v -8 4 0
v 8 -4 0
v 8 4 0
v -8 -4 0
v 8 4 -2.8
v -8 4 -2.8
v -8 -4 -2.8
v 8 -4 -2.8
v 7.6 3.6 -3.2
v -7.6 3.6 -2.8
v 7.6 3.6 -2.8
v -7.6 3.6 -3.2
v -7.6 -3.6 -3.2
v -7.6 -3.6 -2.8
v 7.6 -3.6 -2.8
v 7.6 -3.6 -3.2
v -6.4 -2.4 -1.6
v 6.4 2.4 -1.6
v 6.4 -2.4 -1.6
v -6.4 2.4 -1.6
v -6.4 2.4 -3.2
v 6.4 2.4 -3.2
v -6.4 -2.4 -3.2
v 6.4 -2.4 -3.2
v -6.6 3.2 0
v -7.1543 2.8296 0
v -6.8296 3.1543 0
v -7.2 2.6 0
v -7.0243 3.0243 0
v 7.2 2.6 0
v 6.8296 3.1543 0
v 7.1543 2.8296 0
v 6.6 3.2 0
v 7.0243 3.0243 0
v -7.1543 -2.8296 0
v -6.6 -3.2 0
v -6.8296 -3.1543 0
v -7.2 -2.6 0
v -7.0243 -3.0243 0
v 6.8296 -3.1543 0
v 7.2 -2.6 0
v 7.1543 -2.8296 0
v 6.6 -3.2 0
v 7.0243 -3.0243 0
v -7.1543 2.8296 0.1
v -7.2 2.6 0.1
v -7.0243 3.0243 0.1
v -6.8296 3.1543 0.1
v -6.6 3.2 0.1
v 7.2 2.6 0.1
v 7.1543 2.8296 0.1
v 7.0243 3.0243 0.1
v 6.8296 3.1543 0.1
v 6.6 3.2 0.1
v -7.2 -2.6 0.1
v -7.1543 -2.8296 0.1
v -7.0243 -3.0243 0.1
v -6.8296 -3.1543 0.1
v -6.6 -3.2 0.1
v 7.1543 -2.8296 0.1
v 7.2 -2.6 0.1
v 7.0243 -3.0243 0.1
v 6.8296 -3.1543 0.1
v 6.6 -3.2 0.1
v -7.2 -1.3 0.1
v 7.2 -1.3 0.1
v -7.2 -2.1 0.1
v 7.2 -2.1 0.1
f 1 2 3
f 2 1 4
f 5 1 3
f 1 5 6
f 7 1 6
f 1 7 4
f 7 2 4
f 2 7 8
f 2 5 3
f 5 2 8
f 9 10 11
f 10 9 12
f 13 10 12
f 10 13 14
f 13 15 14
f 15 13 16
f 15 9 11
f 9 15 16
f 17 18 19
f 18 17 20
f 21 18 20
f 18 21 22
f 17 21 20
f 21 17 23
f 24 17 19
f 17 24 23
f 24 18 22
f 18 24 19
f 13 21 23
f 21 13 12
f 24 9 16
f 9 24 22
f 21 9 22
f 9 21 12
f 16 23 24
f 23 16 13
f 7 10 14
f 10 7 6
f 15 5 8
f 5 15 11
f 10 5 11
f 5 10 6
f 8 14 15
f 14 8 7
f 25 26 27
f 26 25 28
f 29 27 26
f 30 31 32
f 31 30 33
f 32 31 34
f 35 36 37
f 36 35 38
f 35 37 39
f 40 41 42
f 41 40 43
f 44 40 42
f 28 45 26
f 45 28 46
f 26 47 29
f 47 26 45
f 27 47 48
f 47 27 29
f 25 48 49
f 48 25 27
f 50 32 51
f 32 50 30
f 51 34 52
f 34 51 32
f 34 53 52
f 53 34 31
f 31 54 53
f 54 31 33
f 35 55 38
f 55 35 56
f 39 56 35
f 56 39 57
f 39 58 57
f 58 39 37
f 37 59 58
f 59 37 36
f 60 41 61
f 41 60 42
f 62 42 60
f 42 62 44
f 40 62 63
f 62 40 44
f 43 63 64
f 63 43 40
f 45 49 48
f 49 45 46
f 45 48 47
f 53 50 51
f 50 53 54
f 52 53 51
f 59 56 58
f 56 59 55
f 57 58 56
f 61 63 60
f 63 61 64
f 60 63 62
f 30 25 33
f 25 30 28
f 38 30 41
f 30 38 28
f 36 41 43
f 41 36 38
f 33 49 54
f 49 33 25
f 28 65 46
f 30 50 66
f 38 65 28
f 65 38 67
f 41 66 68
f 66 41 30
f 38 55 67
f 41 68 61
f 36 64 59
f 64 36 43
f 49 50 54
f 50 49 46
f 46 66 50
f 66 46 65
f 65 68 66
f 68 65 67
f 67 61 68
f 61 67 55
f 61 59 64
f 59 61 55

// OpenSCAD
// file: ../p/box5.scad
use <../lib.scad>
function ldraw_lib__box5() = [
// 0 Box with 5 Faces and All Edges
// 0 Name: box5.dat
// 0 Author: James Jessiman
// 0 !LDRAW_ORG Primitive UPDATE 2012-01
// 0 !LICENSE Licensed under CC BY 4.0 : see CAreadme.txt
// 
// 0 BFC CERTIFY CCW
  [0,"BFC","CERTIFY"],
  [0,"BFC","CCW"],
// 
// 0 !HISTORY 2002-04-03 [sbliss] Modified for BFC compliance
// 0 !HISTORY 2002-04-25 [PTadmin] Official Update 2002-02
// 0 !HISTORY 2007-06-24 [PTadmin] Header formatted for Contributor Agreement
// 0 !HISTORY 2008-07-01 [PTadmin] Official Update 2008-01
// 0 !HISTORY 2012-02-16 [Philo] Changed to CCW
// 0 !HISTORY 2012-03-30 [PTadmin] Official Update 2012-01
// 
// 
// 2 24 1 1 1 -1 1 1
  [2,24,1,1,1,-1,1,1],
// 2 24 -1 1 1 -1 1 -1
  [2,24,-1,1,1,-1,1,-1],
// 2 24 -1 1 -1 1 1 -1
  [2,24,-1,1,-1,1,1,-1],
// 2 24 1 1 -1 1 1 1
  [2,24,1,1,-1,1,1,1],
// 2 24 1 0 1 -1 0 1
  [2,24,1,0,1,-1,0,1],
// 2 24 -1 0 1 -1 0 -1
  [2,24,-1,0,1,-1,0,-1],
// 2 24 -1 0 -1 1 0 -1
  [2,24,-1,0,-1,1,0,-1],
// 2 24 1 0 -1 1 0 1
  [2,24,1,0,-1,1,0,1],
// 2 24 1 0 1 1 1 1
  [2,24,1,0,1,1,1,1],
// 2 24 -1 0 1 -1 1 1
  [2,24,-1,0,1,-1,1,1],
// 2 24 1 0 -1 1 1 -1
  [2,24,1,0,-1,1,1,-1],
// 2 24 -1 0 -1 -1 1 -1
  [2,24,-1,0,-1,-1,1,-1],
// 4 16 -1 1 1 1 1 1 1 1 -1 -1 1 -1
  [4,16,-1,1,1,1,1,1,1,1,-1,-1,1,-1],
// 4 16 -1 1 1 -1 0 1 1 0 1 1 1 1
  [4,16,-1,1,1,-1,0,1,1,0,1,1,1,1],
// 4 16 -1 1 -1 -1 0 -1 -1 0 1 -1 1 1
  [4,16,-1,1,-1,-1,0,-1,-1,0,1,-1,1,1],
// 4 16 1 1 -1 1 0 -1 -1 0 -1 -1 1 -1
  [4,16,1,1,-1,1,0,-1,-1,0,-1,-1,1,-1],
// 4 16 1 1 1 1 0 1 1 0 -1 1 1 -1
  [4,16,1,1,1,1,0,1,1,0,-1,1,1,-1],
];
module ldraw_lib__box5(step=0, col=false, unit=2/5, alt=false, line=0.2, solid=!$preview)
    makepoly(ldraw_lib__box5(), step=step, col=col, unit=unit, alt=alt, line=line, solid=solid);
ldraw_lib__box5(line=0.2);
// file: ../p/box4.scad
use <../lib.scad>
function ldraw_lib__box4() = [
// 0 Box with 4 Faces (2 Parallel Pairs) and All Edges
// 0 Name: box4.dat
// 0 Author: James Jessiman
// 0 !LDRAW_ORG Primitive UPDATE 2012-01
// 0 !LICENSE Licensed under CC BY 4.0 : see CAreadme.txt
// 
// 0 BFC CERTIFY CCW
  [0,"BFC","CERTIFY"],
  [0,"BFC","CCW"],
// 
// 0 !HISTORY 2002-04-03 [sbliss] Modified for BFC compliance
// 0 !HISTORY 2002-04-25 [PTadmin] Official Update 2002-02
// 0 !HISTORY 2007-06-24 [PTadmin] Header formatted for Contributor Agreement
// 0 !HISTORY 2008-07-01 [PTadmin] Official Update 2008-01
// 0 !HISTORY 2012-02-16 [Philo] Changed to CCW
// 0 !HISTORY 2012-03-30 [PTadmin] Official Update 2012-01
// 
// 
// 2 24 1 1 1 -1 1 1
  [2,24,1,1,1,-1,1,1],
// 2 24 -1 1 1 -1 1 -1
  [2,24,-1,1,1,-1,1,-1],
// 2 24 -1 1 -1 1 1 -1
  [2,24,-1,1,-1,1,1,-1],
// 2 24 1 1 -1 1 1 1
  [2,24,1,1,-1,1,1,1],
// 2 24 1 0 1 -1 0 1
  [2,24,1,0,1,-1,0,1],
// 2 24 -1 0 1 -1 0 -1
  [2,24,-1,0,1,-1,0,-1],
// 2 24 -1 0 -1 1 0 -1
  [2,24,-1,0,-1,1,0,-1],
// 2 24 1 0 -1 1 0 1
  [2,24,1,0,-1,1,0,1],
// 2 24 1 0 1 1 1 1
  [2,24,1,0,1,1,1,1],
// 2 24 -1 0 1 -1 1 1
  [2,24,-1,0,1,-1,1,1],
// 2 24 1 0 -1 1 1 -1
  [2,24,1,0,-1,1,1,-1],
// 2 24 -1 0 -1 -1 1 -1
  [2,24,-1,0,-1,-1,1,-1],
// 4 16 -1 1 1 -1 0 1 1 0 1 1 1 1
  [4,16,-1,1,1,-1,0,1,1,0,1,1,1,1],
// 4 16 -1 1 -1 -1 0 -1 -1 0 1 -1 1 1
  [4,16,-1,1,-1,-1,0,-1,-1,0,1,-1,1,1],
// 4 16 1 1 -1 1 0 -1 -1 0 -1 -1 1 -1
  [4,16,1,1,-1,1,0,-1,-1,0,-1,-1,1,-1],
// 4 16 1 1 1 1 0 1 1 0 -1 1 1 -1
  [4,16,1,1,1,1,0,1,1,0,-1,1,1,-1],
];
module ldraw_lib__box4(step=0, col=false, unit=2/5, alt=false, line=0.2, solid=!$preview)
    makepoly(ldraw_lib__box4(), step=step, col=col, unit=unit, alt=alt, line=line, solid=solid);
ldraw_lib__box4(line=0.2);
// file: ../p/1-4cyli.scad
use <../lib.scad>
function ldraw_lib__1_4cyli() = [
// 0 Cylinder 0.25
// 0 Name: 1-4cyli.dat
// 0 Author: James Jessiman
// 0 !LDRAW_ORG Primitive UPDATE 2012-01
// 0 !LICENSE Licensed under CC BY 4.0 : see CAreadme.txt
// 
// 0 BFC CERTIFY CCW
  [0,"BFC","CERTIFY"],
  [0,"BFC","CCW"],
// 
// 0 !HISTORY 2002-03-23 [sbliss] Added BFC statement.
// 0 !HISTORY 2002-04-25 [PTadmin] Official Update 2002-02
// 0 !HISTORY 2007-06-22 [PTadmin] Header formatted for Contributor Agreement
// 0 !HISTORY 2008-07-01 [PTadmin] Official Update 2008-01
// 0 !HISTORY 2012-02-16 [Philo] Changed to CCW
// 0 !HISTORY 2012-03-30 [PTadmin] Official Update 2012-01
// 
// 
// 4 16 1 1 0 0.9239 1 0.3827 0.9239 0 0.3827 1 0 0
  [4,16,1,1,0,0.9239,1,0.3827,0.9239,0,0.3827,1,0,0],
// 5 24 1 0 0 1 1 0 0.9239 0 0.3827 1 0 -1
  [5,24,1,0,0,1,1,0,0.9239,0,0.3827,1,0,-1],
// 4 16 0.9239 1 0.3827 0.7071 1 0.7071 0.7071 0 0.7071 0.9239 0 0.3827
  [4,16,0.9239,1,0.3827,0.7071,1,0.7071,0.7071,0,0.7071,0.9239,0,0.3827],
// 5 24 0.9239 0 0.3827 0.9239 1 0.3827 0.7071 0 0.7071 1 0 0
  [5,24,0.9239,0,0.3827,0.9239,1,0.3827,0.7071,0,0.7071,1,0,0],
// 4 16 0.7071 1 0.7071 0.3827 1 0.9239 0.3827 0 0.9239 0.7071 0 0.7071
  [4,16,0.7071,1,0.7071,0.3827,1,0.9239,0.3827,0,0.9239,0.7071,0,0.7071],
// 5 24 0.7071 0 0.7071 0.7071 1 0.7071 0.3827 0 0.9239 0.9239 0 0.3827
  [5,24,0.7071,0,0.7071,0.7071,1,0.7071,0.3827,0,0.9239,0.9239,0,0.3827],
// 4 16 0.3827 1 0.9239 0 1 1 0 0 1 0.3827 0 0.9239
  [4,16,0.3827,1,0.9239,0,1,1,0,0,1,0.3827,0,0.9239],
// 5 24 0.3827 0 0.9239 0.3827 1 0.9239 0 0 1 0.7071 0 0.7071
  [5,24,0.3827,0,0.9239,0.3827,1,0.9239,0,0,1,0.7071,0,0.7071],
// 5 24 0 0 1 0 1 1 0.3827 0 0.9239 -1 0 1
  [5,24,0,0,1,0,1,1,0.3827,0,0.9239,-1,0,1],
];
module ldraw_lib__1_4cyli(step=0, col=false, unit=2/5, alt=false, line=0.2, solid=!$preview)
    makepoly(ldraw_lib__1_4cyli(), step=step, col=col, unit=unit, alt=alt, line=line, solid=solid);
ldraw_lib__1_4cyli(line=0.2);
// file: ../p/1-4chrd.scad
use <../lib.scad>
function ldraw_lib__1_4chrd() = [
// 0 Chord 0.25
// 0 Name: 1-4chrd.dat
// 0 Author: Max Martin Richter [MMR1988]
// 0 !LDRAW_ORG Primitive UPDATE 2023-05
// 0 !LICENSE Licensed under CC BY 4.0 : see CAreadme.txt
// 
// 0 BFC CERTIFY CCW
  [0,"BFC","CERTIFY"],
  [0,"BFC","CCW"],
// 
// 0 !HISTORY 2004-04-22 [PTadmin] Official Update 2004-02
// 0 !HISTORY 2007-10-09 [PTadmin] Header formatted for Contributor Agreement
// 0 !HISTORY 2008-07-01 [PTadmin] Official Update 2008-01
// 0 !HISTORY 2012-08-02 [MMR1988] Re-creation with PrimGen2 and Rectifier
// 0 !HISTORY 2012-08-09 [PTadmin] Official Update 2012-02
// 0 !HISTORY 2023-10-27 [OrionP] Change author to MMR1988 from hafhead
// 0 !HISTORY 2023-10-31 [OrionP] Official Update 2023-05
// 
// 4 16 0.9239 0 0.3827 0.3827 0 0.9239 0 0 1 1 0 0
  [4,16,0.9239,0,0.3827,0.3827,0,0.9239,0,0,1,1,0,0],
// 3 16 0.7071 0 0.7071 0.3827 0 0.9239 0.9239 0 0.3827
  [3,16,0.7071,0,0.7071,0.3827,0,0.9239,0.9239,0,0.3827],
];
module ldraw_lib__1_4chrd(step=0, col=false, unit=2/5, alt=false, line=0.2, solid=!$preview)
    makepoly(ldraw_lib__1_4chrd(), step=step, col=col, unit=unit, alt=alt, line=line, solid=solid);
ldraw_lib__1_4chrd(line=0.2);
// file: s/3069bs01.scad
use <../../lib.scad>
use <../../p/box4.scad>
use <../../p/box5.scad>
function ldraw_lib__s__3069bs01() = [
// 0 ~Tile  1 x  2 with Groove without Top Face
// 0 Name: s\3069bs01.dat
// 0 Author: Santeri Piippo [arezey]
// 0 !LDRAW_ORG Subpart UPDATE 2010-02
// 0 !LICENSE Licensed under CC BY 4.0 : see CAreadme.txt
// 
// 0 BFC CERTIFY CCW
  [0,"BFC","CERTIFY"],
  [0,"BFC","CCW"],
// 
// 0 !HISTORY 2010-07-05 [PTadmin] Official Update 2010-02
// 
// 
// 1 16 0 0 0 20 0 0 0 7 0 0 0 10 box4.dat
  [1,16,0,0,0,20,0,0,0,7,0,0,0,10, ldraw_lib__box4()],
// 1 16 0 7 0 19 0 0 0 1 0 0 0 9 box4.dat
  [1,16,0,7,0,19,0,0,0,1,0,0,0,9, ldraw_lib__box4()],
// 0 BFC INVERTNEXT
  [0,"BFC","INVERTNEXT"],
// 1 16 0 8 0 16 0 0 0 -4 0 0 0 6 box5.dat
  [1,16,0,8,0,16,0,0,0,-4,0,0,0,6, ldraw_lib__box5()],
// 4 16 -19 8 9 -16 8 6 -16 8 -6 -19 8 -9
  [4,16,-19,8,9,-16,8,6,-16,8,-6,-19,8,-9],
// 4 16 19 8 -9 16 8 -6 16 8 6 19 8 9
  [4,16,19,8,-9,16,8,-6,16,8,6,19,8,9],
// 4 16 19 8 9 16 8 6 -16 8 6 -19 8 9
  [4,16,19,8,9,16,8,6,-16,8,6,-19,8,9],
// 4 16 -19 8 -9 -16 8 -6 16 8 -6 19 8 -9
  [4,16,-19,8,-9,-16,8,-6,16,8,-6,19,8,-9],
// 4 16 -20 7 10 -19 7 9 -19 7 -9 -20 7 -10
  [4,16,-20,7,10,-19,7,9,-19,7,-9,-20,7,-10],
// 4 16 20 7 -10 19 7 -9 19 7 9 20 7 10
  [4,16,20,7,-10,19,7,-9,19,7,9,20,7,10],
// 4 16 20 7 10 19 7 9 -19 7 9 -20 7 10
  [4,16,20,7,10,19,7,9,-19,7,9,-20,7,10],
// 4 16 -20 7 -10 -19 7 -9 19 7 -9 20 7 -10
  [4,16,-20,7,-10,-19,7,-9,19,7,-9,20,7,-10],
// 0 //
];
module ldraw_lib__s__3069bs01(step=0, col=false, unit=2/5, alt=false, line=0.2, solid=!$preview)
    makepoly(ldraw_lib__s__3069bs01(), step=step, col=col, unit=unit, alt=alt, line=line, solid=solid);
ldraw_lib__s__3069bs01(line=0.2);
// file: 6142622f.scad
use <../lib.scad>
use <../p/1-4chrd.scad>
use <../p/1-4cyli.scad>
function ldraw_lib__6142622f() = [
// 0 Sticker  0.8 x  1.8 with Red Stripe on Black Background
// 0 Name: 6142622f.dat
// 0 Author: Massimo Maso [Sirio]
// 0 !LDRAW_ORG Part UPDATE 2022-02
// 0 !LICENSE Licensed under CC BY 4.0 : see CAreadme.txt
// 
// 0 BFC CERTIFY CCW
  [0,"BFC","CERTIFY"],
  [0,"BFC","CCW"],
// 
// 0 !KEYWORDS Chevrolet, Corvette, Set 75870, Speed Champions
// 
// 0 !HISTORY 2022-03-06 [PTadmin] Official Update 2022-02
// 
// 
// 0 // Primitives
// 
// 1 16 -16.5 0 6.5 -1.5 0 0 0 -1 0 0 0 1.5 1-4chrd.dat
  [1,16,-16.5,0,6.5,-1.5,0,0,0,-1,0,0,0,1.5, ldraw_lib__1_4chrd()],
// 1 16 16.5 0 6.5 1.5 0 0 0 -1 0 0 0 1.5 1-4chrd.dat
  [1,16,16.5,0,6.5,1.5,0,0,0,-1,0,0,0,1.5, ldraw_lib__1_4chrd()],
// 1 16 -16.5 0 -6.5 -1.5 0 0 0 -1 0 0 0 -1.5 1-4chrd.dat
  [1,16,-16.5,0,-6.5,-1.5,0,0,0,-1,0,0,0,-1.5, ldraw_lib__1_4chrd()],
// 1 16 16.5 0 -6.5 1.5 0 0 0 -1 0 0 0 -1.5 1-4chrd.dat
  [1,16,16.5,0,-6.5,1.5,0,0,0,-1,0,0,0,-1.5, ldraw_lib__1_4chrd()],
// 1 16 -16.5 0 6.5 -1.5 0 0 0 -.25 0 0 0 1.5 1-4cyli.dat
  [1,16,-16.5,0,6.5,-1.5,0,0,0,-.25,0,0,0,1.5, ldraw_lib__1_4cyli()],
// 1 16 16.5 0 6.5 1.5 0 0 0 -.25 0 0 0 1.5 1-4cyli.dat
  [1,16,16.5,0,6.5,1.5,0,0,0,-.25,0,0,0,1.5, ldraw_lib__1_4cyli()],
// 1 16 -16.5 0 -6.5 -1.5 0 0 0 -.25 0 0 0 -1.5 1-4cyli.dat
  [1,16,-16.5,0,-6.5,-1.5,0,0,0,-.25,0,0,0,-1.5, ldraw_lib__1_4cyli()],
// 1 16 16.5 0 -6.5 1.5 0 0 0 -.25 0 0 0 -1.5 1-4cyli.dat
  [1,16,16.5,0,-6.5,1.5,0,0,0,-.25,0,0,0,-1.5, ldraw_lib__1_4cyli()],
// 1 0 -16.5 -.25 6.5 -1.5 0 0 0 1 0 0 0 1.5 1-4chrd.dat
  [1,0,-16.5,-.25,6.5,-1.5,0,0,0,1,0,0,0,1.5, ldraw_lib__1_4chrd()],
// 1 0 16.5 -.25 6.5 1.5 0 0 0 1 0 0 0 1.5 1-4chrd.dat
  [1,0,16.5,-.25,6.5,1.5,0,0,0,1,0,0,0,1.5, ldraw_lib__1_4chrd()],
// 1 0 -16.5 -.25 -6.5 -1.5 0 0 0 1 0 0 0 -1.5 1-4chrd.dat
  [1,0,-16.5,-.25,-6.5,-1.5,0,0,0,1,0,0,0,-1.5, ldraw_lib__1_4chrd()],
// 1 0 16.5 -.25 -6.5 1.5 0 0 0 1 0 0 0 -1.5 1-4chrd.dat
  [1,0,16.5,-.25,-6.5,1.5,0,0,0,1,0,0,0,-1.5, ldraw_lib__1_4chrd()],
// 0 // Bottom face
// 4 16 16.5 0 8 18 0 6.5 -18 0 6.5 -16.5 0 8
  [4,16,16.5,0,8,18,0,6.5,-18,0,6.5,-16.5,0,8],
// 4 16 18 0 6.5 18 0 -6.5 -18 0 -6.5 -18 0 6.5
  [4,16,18,0,6.5,18,0,-6.5,-18,0,-6.5,-18,0,6.5],
// 4 16 -18 0 -6.5 18 0 -6.5 16.5 0 -8 -16.5 0 -8
  [4,16,-18,0,-6.5,18,0,-6.5,16.5,0,-8,-16.5,0,-8],
// 0 // Lateral faces
// 4 16 -16.5 0 8 -16.5 -0.25 8 16.5 -0.25 8 16.5 0 8
  [4,16,-16.5,0,8,-16.5,-0.25,8,16.5,-0.25,8,16.5,0,8],
// 3 16 -18 0 6.5 -18 -.25 -3.25 -18 -.25 6.5
  [3,16,-18,0,6.5,-18,-.25,-3.25,-18,-.25,6.5],
// 3 16 18 0 6.5 18 -.25 6.5 18 -.25 -3.25
  [3,16,18,0,6.5,18,-.25,6.5,18,-.25,-3.25],
// 4 16 -18 0 6.5 -18 0 -6.5 -18 -.25 -5.25 -18 -.25 -3.25
  [4,16,-18,0,6.5,-18,0,-6.5,-18,-.25,-5.25,-18,-.25,-3.25],
// 4 16 18 0 6.5 18 -.25 -3.25 18 -.25 -5.25 18 0 -6.5
  [4,16,18,0,6.5,18,-.25,-3.25,18,-.25,-5.25,18,0,-6.5],
// 3 16 -18 0 -6.5 -18 -.25 -6.5 -18 -.25 -5.25
  [3,16,-18,0,-6.5,-18,-.25,-6.5,-18,-.25,-5.25],
// 3 16 18 0 -6.5 18 -.25 -5.25 18 -.25 -6.5
  [3,16,18,0,-6.5,18,-.25,-5.25,18,-.25,-6.5],
// 4 16 16.5 0 -8 16.5 -0.25 -8 -16.5 -0.25 -8 -16.5 0 -8
  [4,16,16.5,0,-8,16.5,-0.25,-8,-16.5,-0.25,-8,-16.5,0,-8],
// 0 // Top face
// 4 0 -16.5 -.25 8 -18 -.25 6.5 18 -.25 6.5 16.5 -.25 8
  [4,0,-16.5,-.25,8,-18,-.25,6.5,18,-.25,6.5,16.5,-.25,8],
// 4 0 -18 -.25 6.5 -18 -.25 -3.25 18 -.25 -3.25 18 -.25 6.5
  [4,0,-18,-.25,6.5,-18,-.25,-3.25,18,-.25,-3.25,18,-.25,6.5],
// 4 4 -18 -.25 -3.25 -18 -.25 -5.25 18 -.25 -5.25 18 -.25 -3.25
  [4,4,-18,-.25,-3.25,-18,-.25,-5.25,18,-.25,-5.25,18,-.25,-3.25],
// 4 0 18 -.25 -6.5 18 -.25 -5.25 -18 -.25 -5.25 -18 -.25 -6.5
  [4,0,18,-.25,-6.5,18,-.25,-5.25,-18,-.25,-5.25,-18,-.25,-6.5],
// 4 0 16.5 -.25 -8 18 -.25 -6.5 -18 -.25 -6.5 -16.5 -.25 -8
  [4,0,16.5,-.25,-8,18,-.25,-6.5,-18,-.25,-6.5,-16.5,-.25,-8],
];
module ldraw_lib__6142622f(step=0, col=false, unit=2/5, alt=false, line=0.2, solid=!$preview)
    makepoly(ldraw_lib__6142622f(), step=step, col=col, unit=unit, alt=alt, line=line, solid=solid);
ldraw_lib__6142622f(line=0.2);
// file: 3069b.scad
use <../lib.scad>
use <s/3069bs01.scad>
function ldraw_lib__3069b() = [
// 0 Tile  1 x  2 with Groove
// 0 Name: 3069b.dat
// 0 Author: Santeri Piippo [arezey]
// 0 !LDRAW_ORG Part UPDATE 2010-02
// 0 !LICENSE Licensed under CC BY 4.0 : see CAreadme.txt
// 
// 0 BFC CERTIFY CCW
  [0,"BFC","CERTIFY"],
  [0,"BFC","CCW"],
// 
// 0 !KEYWORDS BrickLink 3069
// 
// 0 !HISTORY 2010-07-05 [PTadmin] Official Update 2010-02
// 
// 
// 4 16 20 0 -10 20 0 10 -20 0 10 -20 0 -10
  [4,16,20,0,-10,20,0,10,-20,0,10,-20,0,-10],
// 1 16 0 0 0 1 0 0 0 1 0 0 0 1 s\3069bs01.dat
  [1,16,0,0,0,1,0,0,0,1,0,0,0,1, ldraw_lib__s__3069bs01()],
// 0 //
];
module ldraw_lib__3069b(step=0, col=false, unit=2/5, alt=false, line=0.2, solid=!$preview)
    makepoly(ldraw_lib__3069b(), step=step, col=col, unit=unit, alt=alt, line=line, solid=solid);
ldraw_lib__3069b(line=0.2);
// main file
use <../lib.scad>
use <3069b.scad>
use <6142622f.scad>
function ldraw_lib__3069bd2t() = [
// 0 Tile  1 x  2 with Red Stripe on Black Background Sticker
// 0 Name: 3069bd2t.dat
// 0 Author: Alfred Schmitz [AlfredS]
// 0 !LDRAW_ORG Shortcut UPDATE 2026-08
// 0 !LICENSE Licensed under CC BY 4.0 : see CAreadme.txt
// 
// 0 BFC CERTIFY CCW
  [0,"BFC","CERTIFY"],
  [0,"BFC","CCW"],
// 
// 0 !CATEGORY Sticker Shortcut
// 0 !KEYWORDS Chevrolet, Corvette, Set 75870, Speed Champions, Z06
// 
// 0 !HISTORY 2026-08-31 [OrionP] Official Update 2026-08
// 
// 1 16 0 0 0 1 0 0 0 1 0 0 0 1 3069b.dat
  [1,16,0,0,0,1,0,0,0,1,0,0,0,1, ldraw_lib__3069b()],
// 1 16 0 0 0 1 0 0 0 1 0 0 0 1 6142622f.dat
  [1,16,0,0,0,1,0,0,0,1,0,0,0,1, ldraw_lib__6142622f()],
];
module ldraw_lib__3069bd2t(step=0, col=false, unit=2/5, alt=false, line=0.2, solid=!$preview)
    makepoly(ldraw_lib__3069bd2t(), step=step, col=col, unit=unit, alt=alt, line=line, solid=solid);
ldraw_lib__3069bd2t(line=0.2);
